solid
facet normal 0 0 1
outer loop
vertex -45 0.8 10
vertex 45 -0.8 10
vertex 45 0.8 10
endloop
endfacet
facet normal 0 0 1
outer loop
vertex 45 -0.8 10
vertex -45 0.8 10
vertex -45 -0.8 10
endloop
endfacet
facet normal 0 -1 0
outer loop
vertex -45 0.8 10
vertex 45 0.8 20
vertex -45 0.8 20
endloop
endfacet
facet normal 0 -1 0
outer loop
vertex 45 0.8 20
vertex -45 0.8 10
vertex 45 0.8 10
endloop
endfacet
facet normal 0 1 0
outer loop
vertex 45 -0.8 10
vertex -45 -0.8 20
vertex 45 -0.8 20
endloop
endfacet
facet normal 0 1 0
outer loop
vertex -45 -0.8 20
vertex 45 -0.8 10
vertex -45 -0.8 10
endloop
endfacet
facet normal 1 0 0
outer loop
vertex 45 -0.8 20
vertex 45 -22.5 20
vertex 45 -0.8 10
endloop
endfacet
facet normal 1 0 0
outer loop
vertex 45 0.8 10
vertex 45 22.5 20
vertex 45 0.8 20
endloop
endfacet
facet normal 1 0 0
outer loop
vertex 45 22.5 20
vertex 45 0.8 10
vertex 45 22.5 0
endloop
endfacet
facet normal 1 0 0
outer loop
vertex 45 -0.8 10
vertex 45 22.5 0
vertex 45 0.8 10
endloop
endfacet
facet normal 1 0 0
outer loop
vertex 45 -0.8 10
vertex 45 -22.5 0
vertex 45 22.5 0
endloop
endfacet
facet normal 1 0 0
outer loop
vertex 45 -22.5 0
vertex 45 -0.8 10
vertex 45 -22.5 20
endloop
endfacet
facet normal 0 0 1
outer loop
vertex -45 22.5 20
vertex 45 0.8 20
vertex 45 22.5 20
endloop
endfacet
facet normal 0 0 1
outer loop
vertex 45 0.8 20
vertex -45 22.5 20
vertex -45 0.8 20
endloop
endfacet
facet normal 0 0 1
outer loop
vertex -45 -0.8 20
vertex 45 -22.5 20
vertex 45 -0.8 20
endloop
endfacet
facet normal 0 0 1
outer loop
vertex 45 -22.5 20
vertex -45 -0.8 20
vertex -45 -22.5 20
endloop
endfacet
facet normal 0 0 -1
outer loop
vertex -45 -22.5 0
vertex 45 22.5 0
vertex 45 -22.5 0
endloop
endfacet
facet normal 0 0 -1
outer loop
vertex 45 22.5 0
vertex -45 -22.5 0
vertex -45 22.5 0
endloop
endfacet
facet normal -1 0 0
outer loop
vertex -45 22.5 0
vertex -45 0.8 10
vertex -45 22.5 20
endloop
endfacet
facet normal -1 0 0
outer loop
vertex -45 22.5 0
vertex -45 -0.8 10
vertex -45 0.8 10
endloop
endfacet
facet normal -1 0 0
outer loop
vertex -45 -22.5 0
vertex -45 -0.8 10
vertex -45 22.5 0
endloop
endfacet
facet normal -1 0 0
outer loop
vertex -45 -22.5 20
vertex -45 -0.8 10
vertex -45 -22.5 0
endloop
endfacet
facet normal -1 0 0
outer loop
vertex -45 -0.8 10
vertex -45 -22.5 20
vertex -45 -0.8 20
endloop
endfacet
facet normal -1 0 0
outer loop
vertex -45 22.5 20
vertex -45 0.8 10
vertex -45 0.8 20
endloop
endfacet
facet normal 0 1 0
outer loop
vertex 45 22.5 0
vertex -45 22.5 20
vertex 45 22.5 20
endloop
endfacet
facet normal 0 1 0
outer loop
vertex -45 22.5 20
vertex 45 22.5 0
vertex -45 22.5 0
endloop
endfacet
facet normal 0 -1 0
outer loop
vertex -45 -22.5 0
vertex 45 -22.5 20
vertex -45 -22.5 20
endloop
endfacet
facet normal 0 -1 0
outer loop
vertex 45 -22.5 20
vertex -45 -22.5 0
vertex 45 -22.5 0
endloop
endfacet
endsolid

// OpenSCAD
// Microscope slide drying rack
// Print orientation: base block on the bed (z = 0), slots open upward (+Z)

// ---------------- Parameters ----------------
block_len    = 90;    // base block length along X (mm)
block_wid    = 45;    // base block width along Y (mm)
block_h      = 20;    // base block height along Z (mm)

slot_count   = 10;    // number of slide slots
slot_len     = 77;    // slot length along X (mm)
slot_w       = 1.6;   // slot width along Y (mm)
slot_depth   = 10;    // slot depth from top face (mm)
slot_pitch   = 3.5;   // centre-to-centre slot spacing along Y (mm)

eps          = 0.5;   // overshoot of cutters past the top face (mm)

$fn = 64;

// ---------------- Model ----------------
difference() {
    // Solid base block, centred in X and Y, sitting on z = 0
    translate([-block_len / 2, -block_wid / 2, 0])
        cube([block_len, block_wid, block_h]);

    // Parallel slots running along X, centred as a group in X and Y
    for (i = [0 : slot_count - 1]) {
        x = (i - (slot_count - 1) / 2) * slot_pitch;
        translate([x - slot_len / 2, -slot_w / 2, block_h - slot_depth])
            cube([slot_len, slot_w, slot_depth + eps]);
    }
}
